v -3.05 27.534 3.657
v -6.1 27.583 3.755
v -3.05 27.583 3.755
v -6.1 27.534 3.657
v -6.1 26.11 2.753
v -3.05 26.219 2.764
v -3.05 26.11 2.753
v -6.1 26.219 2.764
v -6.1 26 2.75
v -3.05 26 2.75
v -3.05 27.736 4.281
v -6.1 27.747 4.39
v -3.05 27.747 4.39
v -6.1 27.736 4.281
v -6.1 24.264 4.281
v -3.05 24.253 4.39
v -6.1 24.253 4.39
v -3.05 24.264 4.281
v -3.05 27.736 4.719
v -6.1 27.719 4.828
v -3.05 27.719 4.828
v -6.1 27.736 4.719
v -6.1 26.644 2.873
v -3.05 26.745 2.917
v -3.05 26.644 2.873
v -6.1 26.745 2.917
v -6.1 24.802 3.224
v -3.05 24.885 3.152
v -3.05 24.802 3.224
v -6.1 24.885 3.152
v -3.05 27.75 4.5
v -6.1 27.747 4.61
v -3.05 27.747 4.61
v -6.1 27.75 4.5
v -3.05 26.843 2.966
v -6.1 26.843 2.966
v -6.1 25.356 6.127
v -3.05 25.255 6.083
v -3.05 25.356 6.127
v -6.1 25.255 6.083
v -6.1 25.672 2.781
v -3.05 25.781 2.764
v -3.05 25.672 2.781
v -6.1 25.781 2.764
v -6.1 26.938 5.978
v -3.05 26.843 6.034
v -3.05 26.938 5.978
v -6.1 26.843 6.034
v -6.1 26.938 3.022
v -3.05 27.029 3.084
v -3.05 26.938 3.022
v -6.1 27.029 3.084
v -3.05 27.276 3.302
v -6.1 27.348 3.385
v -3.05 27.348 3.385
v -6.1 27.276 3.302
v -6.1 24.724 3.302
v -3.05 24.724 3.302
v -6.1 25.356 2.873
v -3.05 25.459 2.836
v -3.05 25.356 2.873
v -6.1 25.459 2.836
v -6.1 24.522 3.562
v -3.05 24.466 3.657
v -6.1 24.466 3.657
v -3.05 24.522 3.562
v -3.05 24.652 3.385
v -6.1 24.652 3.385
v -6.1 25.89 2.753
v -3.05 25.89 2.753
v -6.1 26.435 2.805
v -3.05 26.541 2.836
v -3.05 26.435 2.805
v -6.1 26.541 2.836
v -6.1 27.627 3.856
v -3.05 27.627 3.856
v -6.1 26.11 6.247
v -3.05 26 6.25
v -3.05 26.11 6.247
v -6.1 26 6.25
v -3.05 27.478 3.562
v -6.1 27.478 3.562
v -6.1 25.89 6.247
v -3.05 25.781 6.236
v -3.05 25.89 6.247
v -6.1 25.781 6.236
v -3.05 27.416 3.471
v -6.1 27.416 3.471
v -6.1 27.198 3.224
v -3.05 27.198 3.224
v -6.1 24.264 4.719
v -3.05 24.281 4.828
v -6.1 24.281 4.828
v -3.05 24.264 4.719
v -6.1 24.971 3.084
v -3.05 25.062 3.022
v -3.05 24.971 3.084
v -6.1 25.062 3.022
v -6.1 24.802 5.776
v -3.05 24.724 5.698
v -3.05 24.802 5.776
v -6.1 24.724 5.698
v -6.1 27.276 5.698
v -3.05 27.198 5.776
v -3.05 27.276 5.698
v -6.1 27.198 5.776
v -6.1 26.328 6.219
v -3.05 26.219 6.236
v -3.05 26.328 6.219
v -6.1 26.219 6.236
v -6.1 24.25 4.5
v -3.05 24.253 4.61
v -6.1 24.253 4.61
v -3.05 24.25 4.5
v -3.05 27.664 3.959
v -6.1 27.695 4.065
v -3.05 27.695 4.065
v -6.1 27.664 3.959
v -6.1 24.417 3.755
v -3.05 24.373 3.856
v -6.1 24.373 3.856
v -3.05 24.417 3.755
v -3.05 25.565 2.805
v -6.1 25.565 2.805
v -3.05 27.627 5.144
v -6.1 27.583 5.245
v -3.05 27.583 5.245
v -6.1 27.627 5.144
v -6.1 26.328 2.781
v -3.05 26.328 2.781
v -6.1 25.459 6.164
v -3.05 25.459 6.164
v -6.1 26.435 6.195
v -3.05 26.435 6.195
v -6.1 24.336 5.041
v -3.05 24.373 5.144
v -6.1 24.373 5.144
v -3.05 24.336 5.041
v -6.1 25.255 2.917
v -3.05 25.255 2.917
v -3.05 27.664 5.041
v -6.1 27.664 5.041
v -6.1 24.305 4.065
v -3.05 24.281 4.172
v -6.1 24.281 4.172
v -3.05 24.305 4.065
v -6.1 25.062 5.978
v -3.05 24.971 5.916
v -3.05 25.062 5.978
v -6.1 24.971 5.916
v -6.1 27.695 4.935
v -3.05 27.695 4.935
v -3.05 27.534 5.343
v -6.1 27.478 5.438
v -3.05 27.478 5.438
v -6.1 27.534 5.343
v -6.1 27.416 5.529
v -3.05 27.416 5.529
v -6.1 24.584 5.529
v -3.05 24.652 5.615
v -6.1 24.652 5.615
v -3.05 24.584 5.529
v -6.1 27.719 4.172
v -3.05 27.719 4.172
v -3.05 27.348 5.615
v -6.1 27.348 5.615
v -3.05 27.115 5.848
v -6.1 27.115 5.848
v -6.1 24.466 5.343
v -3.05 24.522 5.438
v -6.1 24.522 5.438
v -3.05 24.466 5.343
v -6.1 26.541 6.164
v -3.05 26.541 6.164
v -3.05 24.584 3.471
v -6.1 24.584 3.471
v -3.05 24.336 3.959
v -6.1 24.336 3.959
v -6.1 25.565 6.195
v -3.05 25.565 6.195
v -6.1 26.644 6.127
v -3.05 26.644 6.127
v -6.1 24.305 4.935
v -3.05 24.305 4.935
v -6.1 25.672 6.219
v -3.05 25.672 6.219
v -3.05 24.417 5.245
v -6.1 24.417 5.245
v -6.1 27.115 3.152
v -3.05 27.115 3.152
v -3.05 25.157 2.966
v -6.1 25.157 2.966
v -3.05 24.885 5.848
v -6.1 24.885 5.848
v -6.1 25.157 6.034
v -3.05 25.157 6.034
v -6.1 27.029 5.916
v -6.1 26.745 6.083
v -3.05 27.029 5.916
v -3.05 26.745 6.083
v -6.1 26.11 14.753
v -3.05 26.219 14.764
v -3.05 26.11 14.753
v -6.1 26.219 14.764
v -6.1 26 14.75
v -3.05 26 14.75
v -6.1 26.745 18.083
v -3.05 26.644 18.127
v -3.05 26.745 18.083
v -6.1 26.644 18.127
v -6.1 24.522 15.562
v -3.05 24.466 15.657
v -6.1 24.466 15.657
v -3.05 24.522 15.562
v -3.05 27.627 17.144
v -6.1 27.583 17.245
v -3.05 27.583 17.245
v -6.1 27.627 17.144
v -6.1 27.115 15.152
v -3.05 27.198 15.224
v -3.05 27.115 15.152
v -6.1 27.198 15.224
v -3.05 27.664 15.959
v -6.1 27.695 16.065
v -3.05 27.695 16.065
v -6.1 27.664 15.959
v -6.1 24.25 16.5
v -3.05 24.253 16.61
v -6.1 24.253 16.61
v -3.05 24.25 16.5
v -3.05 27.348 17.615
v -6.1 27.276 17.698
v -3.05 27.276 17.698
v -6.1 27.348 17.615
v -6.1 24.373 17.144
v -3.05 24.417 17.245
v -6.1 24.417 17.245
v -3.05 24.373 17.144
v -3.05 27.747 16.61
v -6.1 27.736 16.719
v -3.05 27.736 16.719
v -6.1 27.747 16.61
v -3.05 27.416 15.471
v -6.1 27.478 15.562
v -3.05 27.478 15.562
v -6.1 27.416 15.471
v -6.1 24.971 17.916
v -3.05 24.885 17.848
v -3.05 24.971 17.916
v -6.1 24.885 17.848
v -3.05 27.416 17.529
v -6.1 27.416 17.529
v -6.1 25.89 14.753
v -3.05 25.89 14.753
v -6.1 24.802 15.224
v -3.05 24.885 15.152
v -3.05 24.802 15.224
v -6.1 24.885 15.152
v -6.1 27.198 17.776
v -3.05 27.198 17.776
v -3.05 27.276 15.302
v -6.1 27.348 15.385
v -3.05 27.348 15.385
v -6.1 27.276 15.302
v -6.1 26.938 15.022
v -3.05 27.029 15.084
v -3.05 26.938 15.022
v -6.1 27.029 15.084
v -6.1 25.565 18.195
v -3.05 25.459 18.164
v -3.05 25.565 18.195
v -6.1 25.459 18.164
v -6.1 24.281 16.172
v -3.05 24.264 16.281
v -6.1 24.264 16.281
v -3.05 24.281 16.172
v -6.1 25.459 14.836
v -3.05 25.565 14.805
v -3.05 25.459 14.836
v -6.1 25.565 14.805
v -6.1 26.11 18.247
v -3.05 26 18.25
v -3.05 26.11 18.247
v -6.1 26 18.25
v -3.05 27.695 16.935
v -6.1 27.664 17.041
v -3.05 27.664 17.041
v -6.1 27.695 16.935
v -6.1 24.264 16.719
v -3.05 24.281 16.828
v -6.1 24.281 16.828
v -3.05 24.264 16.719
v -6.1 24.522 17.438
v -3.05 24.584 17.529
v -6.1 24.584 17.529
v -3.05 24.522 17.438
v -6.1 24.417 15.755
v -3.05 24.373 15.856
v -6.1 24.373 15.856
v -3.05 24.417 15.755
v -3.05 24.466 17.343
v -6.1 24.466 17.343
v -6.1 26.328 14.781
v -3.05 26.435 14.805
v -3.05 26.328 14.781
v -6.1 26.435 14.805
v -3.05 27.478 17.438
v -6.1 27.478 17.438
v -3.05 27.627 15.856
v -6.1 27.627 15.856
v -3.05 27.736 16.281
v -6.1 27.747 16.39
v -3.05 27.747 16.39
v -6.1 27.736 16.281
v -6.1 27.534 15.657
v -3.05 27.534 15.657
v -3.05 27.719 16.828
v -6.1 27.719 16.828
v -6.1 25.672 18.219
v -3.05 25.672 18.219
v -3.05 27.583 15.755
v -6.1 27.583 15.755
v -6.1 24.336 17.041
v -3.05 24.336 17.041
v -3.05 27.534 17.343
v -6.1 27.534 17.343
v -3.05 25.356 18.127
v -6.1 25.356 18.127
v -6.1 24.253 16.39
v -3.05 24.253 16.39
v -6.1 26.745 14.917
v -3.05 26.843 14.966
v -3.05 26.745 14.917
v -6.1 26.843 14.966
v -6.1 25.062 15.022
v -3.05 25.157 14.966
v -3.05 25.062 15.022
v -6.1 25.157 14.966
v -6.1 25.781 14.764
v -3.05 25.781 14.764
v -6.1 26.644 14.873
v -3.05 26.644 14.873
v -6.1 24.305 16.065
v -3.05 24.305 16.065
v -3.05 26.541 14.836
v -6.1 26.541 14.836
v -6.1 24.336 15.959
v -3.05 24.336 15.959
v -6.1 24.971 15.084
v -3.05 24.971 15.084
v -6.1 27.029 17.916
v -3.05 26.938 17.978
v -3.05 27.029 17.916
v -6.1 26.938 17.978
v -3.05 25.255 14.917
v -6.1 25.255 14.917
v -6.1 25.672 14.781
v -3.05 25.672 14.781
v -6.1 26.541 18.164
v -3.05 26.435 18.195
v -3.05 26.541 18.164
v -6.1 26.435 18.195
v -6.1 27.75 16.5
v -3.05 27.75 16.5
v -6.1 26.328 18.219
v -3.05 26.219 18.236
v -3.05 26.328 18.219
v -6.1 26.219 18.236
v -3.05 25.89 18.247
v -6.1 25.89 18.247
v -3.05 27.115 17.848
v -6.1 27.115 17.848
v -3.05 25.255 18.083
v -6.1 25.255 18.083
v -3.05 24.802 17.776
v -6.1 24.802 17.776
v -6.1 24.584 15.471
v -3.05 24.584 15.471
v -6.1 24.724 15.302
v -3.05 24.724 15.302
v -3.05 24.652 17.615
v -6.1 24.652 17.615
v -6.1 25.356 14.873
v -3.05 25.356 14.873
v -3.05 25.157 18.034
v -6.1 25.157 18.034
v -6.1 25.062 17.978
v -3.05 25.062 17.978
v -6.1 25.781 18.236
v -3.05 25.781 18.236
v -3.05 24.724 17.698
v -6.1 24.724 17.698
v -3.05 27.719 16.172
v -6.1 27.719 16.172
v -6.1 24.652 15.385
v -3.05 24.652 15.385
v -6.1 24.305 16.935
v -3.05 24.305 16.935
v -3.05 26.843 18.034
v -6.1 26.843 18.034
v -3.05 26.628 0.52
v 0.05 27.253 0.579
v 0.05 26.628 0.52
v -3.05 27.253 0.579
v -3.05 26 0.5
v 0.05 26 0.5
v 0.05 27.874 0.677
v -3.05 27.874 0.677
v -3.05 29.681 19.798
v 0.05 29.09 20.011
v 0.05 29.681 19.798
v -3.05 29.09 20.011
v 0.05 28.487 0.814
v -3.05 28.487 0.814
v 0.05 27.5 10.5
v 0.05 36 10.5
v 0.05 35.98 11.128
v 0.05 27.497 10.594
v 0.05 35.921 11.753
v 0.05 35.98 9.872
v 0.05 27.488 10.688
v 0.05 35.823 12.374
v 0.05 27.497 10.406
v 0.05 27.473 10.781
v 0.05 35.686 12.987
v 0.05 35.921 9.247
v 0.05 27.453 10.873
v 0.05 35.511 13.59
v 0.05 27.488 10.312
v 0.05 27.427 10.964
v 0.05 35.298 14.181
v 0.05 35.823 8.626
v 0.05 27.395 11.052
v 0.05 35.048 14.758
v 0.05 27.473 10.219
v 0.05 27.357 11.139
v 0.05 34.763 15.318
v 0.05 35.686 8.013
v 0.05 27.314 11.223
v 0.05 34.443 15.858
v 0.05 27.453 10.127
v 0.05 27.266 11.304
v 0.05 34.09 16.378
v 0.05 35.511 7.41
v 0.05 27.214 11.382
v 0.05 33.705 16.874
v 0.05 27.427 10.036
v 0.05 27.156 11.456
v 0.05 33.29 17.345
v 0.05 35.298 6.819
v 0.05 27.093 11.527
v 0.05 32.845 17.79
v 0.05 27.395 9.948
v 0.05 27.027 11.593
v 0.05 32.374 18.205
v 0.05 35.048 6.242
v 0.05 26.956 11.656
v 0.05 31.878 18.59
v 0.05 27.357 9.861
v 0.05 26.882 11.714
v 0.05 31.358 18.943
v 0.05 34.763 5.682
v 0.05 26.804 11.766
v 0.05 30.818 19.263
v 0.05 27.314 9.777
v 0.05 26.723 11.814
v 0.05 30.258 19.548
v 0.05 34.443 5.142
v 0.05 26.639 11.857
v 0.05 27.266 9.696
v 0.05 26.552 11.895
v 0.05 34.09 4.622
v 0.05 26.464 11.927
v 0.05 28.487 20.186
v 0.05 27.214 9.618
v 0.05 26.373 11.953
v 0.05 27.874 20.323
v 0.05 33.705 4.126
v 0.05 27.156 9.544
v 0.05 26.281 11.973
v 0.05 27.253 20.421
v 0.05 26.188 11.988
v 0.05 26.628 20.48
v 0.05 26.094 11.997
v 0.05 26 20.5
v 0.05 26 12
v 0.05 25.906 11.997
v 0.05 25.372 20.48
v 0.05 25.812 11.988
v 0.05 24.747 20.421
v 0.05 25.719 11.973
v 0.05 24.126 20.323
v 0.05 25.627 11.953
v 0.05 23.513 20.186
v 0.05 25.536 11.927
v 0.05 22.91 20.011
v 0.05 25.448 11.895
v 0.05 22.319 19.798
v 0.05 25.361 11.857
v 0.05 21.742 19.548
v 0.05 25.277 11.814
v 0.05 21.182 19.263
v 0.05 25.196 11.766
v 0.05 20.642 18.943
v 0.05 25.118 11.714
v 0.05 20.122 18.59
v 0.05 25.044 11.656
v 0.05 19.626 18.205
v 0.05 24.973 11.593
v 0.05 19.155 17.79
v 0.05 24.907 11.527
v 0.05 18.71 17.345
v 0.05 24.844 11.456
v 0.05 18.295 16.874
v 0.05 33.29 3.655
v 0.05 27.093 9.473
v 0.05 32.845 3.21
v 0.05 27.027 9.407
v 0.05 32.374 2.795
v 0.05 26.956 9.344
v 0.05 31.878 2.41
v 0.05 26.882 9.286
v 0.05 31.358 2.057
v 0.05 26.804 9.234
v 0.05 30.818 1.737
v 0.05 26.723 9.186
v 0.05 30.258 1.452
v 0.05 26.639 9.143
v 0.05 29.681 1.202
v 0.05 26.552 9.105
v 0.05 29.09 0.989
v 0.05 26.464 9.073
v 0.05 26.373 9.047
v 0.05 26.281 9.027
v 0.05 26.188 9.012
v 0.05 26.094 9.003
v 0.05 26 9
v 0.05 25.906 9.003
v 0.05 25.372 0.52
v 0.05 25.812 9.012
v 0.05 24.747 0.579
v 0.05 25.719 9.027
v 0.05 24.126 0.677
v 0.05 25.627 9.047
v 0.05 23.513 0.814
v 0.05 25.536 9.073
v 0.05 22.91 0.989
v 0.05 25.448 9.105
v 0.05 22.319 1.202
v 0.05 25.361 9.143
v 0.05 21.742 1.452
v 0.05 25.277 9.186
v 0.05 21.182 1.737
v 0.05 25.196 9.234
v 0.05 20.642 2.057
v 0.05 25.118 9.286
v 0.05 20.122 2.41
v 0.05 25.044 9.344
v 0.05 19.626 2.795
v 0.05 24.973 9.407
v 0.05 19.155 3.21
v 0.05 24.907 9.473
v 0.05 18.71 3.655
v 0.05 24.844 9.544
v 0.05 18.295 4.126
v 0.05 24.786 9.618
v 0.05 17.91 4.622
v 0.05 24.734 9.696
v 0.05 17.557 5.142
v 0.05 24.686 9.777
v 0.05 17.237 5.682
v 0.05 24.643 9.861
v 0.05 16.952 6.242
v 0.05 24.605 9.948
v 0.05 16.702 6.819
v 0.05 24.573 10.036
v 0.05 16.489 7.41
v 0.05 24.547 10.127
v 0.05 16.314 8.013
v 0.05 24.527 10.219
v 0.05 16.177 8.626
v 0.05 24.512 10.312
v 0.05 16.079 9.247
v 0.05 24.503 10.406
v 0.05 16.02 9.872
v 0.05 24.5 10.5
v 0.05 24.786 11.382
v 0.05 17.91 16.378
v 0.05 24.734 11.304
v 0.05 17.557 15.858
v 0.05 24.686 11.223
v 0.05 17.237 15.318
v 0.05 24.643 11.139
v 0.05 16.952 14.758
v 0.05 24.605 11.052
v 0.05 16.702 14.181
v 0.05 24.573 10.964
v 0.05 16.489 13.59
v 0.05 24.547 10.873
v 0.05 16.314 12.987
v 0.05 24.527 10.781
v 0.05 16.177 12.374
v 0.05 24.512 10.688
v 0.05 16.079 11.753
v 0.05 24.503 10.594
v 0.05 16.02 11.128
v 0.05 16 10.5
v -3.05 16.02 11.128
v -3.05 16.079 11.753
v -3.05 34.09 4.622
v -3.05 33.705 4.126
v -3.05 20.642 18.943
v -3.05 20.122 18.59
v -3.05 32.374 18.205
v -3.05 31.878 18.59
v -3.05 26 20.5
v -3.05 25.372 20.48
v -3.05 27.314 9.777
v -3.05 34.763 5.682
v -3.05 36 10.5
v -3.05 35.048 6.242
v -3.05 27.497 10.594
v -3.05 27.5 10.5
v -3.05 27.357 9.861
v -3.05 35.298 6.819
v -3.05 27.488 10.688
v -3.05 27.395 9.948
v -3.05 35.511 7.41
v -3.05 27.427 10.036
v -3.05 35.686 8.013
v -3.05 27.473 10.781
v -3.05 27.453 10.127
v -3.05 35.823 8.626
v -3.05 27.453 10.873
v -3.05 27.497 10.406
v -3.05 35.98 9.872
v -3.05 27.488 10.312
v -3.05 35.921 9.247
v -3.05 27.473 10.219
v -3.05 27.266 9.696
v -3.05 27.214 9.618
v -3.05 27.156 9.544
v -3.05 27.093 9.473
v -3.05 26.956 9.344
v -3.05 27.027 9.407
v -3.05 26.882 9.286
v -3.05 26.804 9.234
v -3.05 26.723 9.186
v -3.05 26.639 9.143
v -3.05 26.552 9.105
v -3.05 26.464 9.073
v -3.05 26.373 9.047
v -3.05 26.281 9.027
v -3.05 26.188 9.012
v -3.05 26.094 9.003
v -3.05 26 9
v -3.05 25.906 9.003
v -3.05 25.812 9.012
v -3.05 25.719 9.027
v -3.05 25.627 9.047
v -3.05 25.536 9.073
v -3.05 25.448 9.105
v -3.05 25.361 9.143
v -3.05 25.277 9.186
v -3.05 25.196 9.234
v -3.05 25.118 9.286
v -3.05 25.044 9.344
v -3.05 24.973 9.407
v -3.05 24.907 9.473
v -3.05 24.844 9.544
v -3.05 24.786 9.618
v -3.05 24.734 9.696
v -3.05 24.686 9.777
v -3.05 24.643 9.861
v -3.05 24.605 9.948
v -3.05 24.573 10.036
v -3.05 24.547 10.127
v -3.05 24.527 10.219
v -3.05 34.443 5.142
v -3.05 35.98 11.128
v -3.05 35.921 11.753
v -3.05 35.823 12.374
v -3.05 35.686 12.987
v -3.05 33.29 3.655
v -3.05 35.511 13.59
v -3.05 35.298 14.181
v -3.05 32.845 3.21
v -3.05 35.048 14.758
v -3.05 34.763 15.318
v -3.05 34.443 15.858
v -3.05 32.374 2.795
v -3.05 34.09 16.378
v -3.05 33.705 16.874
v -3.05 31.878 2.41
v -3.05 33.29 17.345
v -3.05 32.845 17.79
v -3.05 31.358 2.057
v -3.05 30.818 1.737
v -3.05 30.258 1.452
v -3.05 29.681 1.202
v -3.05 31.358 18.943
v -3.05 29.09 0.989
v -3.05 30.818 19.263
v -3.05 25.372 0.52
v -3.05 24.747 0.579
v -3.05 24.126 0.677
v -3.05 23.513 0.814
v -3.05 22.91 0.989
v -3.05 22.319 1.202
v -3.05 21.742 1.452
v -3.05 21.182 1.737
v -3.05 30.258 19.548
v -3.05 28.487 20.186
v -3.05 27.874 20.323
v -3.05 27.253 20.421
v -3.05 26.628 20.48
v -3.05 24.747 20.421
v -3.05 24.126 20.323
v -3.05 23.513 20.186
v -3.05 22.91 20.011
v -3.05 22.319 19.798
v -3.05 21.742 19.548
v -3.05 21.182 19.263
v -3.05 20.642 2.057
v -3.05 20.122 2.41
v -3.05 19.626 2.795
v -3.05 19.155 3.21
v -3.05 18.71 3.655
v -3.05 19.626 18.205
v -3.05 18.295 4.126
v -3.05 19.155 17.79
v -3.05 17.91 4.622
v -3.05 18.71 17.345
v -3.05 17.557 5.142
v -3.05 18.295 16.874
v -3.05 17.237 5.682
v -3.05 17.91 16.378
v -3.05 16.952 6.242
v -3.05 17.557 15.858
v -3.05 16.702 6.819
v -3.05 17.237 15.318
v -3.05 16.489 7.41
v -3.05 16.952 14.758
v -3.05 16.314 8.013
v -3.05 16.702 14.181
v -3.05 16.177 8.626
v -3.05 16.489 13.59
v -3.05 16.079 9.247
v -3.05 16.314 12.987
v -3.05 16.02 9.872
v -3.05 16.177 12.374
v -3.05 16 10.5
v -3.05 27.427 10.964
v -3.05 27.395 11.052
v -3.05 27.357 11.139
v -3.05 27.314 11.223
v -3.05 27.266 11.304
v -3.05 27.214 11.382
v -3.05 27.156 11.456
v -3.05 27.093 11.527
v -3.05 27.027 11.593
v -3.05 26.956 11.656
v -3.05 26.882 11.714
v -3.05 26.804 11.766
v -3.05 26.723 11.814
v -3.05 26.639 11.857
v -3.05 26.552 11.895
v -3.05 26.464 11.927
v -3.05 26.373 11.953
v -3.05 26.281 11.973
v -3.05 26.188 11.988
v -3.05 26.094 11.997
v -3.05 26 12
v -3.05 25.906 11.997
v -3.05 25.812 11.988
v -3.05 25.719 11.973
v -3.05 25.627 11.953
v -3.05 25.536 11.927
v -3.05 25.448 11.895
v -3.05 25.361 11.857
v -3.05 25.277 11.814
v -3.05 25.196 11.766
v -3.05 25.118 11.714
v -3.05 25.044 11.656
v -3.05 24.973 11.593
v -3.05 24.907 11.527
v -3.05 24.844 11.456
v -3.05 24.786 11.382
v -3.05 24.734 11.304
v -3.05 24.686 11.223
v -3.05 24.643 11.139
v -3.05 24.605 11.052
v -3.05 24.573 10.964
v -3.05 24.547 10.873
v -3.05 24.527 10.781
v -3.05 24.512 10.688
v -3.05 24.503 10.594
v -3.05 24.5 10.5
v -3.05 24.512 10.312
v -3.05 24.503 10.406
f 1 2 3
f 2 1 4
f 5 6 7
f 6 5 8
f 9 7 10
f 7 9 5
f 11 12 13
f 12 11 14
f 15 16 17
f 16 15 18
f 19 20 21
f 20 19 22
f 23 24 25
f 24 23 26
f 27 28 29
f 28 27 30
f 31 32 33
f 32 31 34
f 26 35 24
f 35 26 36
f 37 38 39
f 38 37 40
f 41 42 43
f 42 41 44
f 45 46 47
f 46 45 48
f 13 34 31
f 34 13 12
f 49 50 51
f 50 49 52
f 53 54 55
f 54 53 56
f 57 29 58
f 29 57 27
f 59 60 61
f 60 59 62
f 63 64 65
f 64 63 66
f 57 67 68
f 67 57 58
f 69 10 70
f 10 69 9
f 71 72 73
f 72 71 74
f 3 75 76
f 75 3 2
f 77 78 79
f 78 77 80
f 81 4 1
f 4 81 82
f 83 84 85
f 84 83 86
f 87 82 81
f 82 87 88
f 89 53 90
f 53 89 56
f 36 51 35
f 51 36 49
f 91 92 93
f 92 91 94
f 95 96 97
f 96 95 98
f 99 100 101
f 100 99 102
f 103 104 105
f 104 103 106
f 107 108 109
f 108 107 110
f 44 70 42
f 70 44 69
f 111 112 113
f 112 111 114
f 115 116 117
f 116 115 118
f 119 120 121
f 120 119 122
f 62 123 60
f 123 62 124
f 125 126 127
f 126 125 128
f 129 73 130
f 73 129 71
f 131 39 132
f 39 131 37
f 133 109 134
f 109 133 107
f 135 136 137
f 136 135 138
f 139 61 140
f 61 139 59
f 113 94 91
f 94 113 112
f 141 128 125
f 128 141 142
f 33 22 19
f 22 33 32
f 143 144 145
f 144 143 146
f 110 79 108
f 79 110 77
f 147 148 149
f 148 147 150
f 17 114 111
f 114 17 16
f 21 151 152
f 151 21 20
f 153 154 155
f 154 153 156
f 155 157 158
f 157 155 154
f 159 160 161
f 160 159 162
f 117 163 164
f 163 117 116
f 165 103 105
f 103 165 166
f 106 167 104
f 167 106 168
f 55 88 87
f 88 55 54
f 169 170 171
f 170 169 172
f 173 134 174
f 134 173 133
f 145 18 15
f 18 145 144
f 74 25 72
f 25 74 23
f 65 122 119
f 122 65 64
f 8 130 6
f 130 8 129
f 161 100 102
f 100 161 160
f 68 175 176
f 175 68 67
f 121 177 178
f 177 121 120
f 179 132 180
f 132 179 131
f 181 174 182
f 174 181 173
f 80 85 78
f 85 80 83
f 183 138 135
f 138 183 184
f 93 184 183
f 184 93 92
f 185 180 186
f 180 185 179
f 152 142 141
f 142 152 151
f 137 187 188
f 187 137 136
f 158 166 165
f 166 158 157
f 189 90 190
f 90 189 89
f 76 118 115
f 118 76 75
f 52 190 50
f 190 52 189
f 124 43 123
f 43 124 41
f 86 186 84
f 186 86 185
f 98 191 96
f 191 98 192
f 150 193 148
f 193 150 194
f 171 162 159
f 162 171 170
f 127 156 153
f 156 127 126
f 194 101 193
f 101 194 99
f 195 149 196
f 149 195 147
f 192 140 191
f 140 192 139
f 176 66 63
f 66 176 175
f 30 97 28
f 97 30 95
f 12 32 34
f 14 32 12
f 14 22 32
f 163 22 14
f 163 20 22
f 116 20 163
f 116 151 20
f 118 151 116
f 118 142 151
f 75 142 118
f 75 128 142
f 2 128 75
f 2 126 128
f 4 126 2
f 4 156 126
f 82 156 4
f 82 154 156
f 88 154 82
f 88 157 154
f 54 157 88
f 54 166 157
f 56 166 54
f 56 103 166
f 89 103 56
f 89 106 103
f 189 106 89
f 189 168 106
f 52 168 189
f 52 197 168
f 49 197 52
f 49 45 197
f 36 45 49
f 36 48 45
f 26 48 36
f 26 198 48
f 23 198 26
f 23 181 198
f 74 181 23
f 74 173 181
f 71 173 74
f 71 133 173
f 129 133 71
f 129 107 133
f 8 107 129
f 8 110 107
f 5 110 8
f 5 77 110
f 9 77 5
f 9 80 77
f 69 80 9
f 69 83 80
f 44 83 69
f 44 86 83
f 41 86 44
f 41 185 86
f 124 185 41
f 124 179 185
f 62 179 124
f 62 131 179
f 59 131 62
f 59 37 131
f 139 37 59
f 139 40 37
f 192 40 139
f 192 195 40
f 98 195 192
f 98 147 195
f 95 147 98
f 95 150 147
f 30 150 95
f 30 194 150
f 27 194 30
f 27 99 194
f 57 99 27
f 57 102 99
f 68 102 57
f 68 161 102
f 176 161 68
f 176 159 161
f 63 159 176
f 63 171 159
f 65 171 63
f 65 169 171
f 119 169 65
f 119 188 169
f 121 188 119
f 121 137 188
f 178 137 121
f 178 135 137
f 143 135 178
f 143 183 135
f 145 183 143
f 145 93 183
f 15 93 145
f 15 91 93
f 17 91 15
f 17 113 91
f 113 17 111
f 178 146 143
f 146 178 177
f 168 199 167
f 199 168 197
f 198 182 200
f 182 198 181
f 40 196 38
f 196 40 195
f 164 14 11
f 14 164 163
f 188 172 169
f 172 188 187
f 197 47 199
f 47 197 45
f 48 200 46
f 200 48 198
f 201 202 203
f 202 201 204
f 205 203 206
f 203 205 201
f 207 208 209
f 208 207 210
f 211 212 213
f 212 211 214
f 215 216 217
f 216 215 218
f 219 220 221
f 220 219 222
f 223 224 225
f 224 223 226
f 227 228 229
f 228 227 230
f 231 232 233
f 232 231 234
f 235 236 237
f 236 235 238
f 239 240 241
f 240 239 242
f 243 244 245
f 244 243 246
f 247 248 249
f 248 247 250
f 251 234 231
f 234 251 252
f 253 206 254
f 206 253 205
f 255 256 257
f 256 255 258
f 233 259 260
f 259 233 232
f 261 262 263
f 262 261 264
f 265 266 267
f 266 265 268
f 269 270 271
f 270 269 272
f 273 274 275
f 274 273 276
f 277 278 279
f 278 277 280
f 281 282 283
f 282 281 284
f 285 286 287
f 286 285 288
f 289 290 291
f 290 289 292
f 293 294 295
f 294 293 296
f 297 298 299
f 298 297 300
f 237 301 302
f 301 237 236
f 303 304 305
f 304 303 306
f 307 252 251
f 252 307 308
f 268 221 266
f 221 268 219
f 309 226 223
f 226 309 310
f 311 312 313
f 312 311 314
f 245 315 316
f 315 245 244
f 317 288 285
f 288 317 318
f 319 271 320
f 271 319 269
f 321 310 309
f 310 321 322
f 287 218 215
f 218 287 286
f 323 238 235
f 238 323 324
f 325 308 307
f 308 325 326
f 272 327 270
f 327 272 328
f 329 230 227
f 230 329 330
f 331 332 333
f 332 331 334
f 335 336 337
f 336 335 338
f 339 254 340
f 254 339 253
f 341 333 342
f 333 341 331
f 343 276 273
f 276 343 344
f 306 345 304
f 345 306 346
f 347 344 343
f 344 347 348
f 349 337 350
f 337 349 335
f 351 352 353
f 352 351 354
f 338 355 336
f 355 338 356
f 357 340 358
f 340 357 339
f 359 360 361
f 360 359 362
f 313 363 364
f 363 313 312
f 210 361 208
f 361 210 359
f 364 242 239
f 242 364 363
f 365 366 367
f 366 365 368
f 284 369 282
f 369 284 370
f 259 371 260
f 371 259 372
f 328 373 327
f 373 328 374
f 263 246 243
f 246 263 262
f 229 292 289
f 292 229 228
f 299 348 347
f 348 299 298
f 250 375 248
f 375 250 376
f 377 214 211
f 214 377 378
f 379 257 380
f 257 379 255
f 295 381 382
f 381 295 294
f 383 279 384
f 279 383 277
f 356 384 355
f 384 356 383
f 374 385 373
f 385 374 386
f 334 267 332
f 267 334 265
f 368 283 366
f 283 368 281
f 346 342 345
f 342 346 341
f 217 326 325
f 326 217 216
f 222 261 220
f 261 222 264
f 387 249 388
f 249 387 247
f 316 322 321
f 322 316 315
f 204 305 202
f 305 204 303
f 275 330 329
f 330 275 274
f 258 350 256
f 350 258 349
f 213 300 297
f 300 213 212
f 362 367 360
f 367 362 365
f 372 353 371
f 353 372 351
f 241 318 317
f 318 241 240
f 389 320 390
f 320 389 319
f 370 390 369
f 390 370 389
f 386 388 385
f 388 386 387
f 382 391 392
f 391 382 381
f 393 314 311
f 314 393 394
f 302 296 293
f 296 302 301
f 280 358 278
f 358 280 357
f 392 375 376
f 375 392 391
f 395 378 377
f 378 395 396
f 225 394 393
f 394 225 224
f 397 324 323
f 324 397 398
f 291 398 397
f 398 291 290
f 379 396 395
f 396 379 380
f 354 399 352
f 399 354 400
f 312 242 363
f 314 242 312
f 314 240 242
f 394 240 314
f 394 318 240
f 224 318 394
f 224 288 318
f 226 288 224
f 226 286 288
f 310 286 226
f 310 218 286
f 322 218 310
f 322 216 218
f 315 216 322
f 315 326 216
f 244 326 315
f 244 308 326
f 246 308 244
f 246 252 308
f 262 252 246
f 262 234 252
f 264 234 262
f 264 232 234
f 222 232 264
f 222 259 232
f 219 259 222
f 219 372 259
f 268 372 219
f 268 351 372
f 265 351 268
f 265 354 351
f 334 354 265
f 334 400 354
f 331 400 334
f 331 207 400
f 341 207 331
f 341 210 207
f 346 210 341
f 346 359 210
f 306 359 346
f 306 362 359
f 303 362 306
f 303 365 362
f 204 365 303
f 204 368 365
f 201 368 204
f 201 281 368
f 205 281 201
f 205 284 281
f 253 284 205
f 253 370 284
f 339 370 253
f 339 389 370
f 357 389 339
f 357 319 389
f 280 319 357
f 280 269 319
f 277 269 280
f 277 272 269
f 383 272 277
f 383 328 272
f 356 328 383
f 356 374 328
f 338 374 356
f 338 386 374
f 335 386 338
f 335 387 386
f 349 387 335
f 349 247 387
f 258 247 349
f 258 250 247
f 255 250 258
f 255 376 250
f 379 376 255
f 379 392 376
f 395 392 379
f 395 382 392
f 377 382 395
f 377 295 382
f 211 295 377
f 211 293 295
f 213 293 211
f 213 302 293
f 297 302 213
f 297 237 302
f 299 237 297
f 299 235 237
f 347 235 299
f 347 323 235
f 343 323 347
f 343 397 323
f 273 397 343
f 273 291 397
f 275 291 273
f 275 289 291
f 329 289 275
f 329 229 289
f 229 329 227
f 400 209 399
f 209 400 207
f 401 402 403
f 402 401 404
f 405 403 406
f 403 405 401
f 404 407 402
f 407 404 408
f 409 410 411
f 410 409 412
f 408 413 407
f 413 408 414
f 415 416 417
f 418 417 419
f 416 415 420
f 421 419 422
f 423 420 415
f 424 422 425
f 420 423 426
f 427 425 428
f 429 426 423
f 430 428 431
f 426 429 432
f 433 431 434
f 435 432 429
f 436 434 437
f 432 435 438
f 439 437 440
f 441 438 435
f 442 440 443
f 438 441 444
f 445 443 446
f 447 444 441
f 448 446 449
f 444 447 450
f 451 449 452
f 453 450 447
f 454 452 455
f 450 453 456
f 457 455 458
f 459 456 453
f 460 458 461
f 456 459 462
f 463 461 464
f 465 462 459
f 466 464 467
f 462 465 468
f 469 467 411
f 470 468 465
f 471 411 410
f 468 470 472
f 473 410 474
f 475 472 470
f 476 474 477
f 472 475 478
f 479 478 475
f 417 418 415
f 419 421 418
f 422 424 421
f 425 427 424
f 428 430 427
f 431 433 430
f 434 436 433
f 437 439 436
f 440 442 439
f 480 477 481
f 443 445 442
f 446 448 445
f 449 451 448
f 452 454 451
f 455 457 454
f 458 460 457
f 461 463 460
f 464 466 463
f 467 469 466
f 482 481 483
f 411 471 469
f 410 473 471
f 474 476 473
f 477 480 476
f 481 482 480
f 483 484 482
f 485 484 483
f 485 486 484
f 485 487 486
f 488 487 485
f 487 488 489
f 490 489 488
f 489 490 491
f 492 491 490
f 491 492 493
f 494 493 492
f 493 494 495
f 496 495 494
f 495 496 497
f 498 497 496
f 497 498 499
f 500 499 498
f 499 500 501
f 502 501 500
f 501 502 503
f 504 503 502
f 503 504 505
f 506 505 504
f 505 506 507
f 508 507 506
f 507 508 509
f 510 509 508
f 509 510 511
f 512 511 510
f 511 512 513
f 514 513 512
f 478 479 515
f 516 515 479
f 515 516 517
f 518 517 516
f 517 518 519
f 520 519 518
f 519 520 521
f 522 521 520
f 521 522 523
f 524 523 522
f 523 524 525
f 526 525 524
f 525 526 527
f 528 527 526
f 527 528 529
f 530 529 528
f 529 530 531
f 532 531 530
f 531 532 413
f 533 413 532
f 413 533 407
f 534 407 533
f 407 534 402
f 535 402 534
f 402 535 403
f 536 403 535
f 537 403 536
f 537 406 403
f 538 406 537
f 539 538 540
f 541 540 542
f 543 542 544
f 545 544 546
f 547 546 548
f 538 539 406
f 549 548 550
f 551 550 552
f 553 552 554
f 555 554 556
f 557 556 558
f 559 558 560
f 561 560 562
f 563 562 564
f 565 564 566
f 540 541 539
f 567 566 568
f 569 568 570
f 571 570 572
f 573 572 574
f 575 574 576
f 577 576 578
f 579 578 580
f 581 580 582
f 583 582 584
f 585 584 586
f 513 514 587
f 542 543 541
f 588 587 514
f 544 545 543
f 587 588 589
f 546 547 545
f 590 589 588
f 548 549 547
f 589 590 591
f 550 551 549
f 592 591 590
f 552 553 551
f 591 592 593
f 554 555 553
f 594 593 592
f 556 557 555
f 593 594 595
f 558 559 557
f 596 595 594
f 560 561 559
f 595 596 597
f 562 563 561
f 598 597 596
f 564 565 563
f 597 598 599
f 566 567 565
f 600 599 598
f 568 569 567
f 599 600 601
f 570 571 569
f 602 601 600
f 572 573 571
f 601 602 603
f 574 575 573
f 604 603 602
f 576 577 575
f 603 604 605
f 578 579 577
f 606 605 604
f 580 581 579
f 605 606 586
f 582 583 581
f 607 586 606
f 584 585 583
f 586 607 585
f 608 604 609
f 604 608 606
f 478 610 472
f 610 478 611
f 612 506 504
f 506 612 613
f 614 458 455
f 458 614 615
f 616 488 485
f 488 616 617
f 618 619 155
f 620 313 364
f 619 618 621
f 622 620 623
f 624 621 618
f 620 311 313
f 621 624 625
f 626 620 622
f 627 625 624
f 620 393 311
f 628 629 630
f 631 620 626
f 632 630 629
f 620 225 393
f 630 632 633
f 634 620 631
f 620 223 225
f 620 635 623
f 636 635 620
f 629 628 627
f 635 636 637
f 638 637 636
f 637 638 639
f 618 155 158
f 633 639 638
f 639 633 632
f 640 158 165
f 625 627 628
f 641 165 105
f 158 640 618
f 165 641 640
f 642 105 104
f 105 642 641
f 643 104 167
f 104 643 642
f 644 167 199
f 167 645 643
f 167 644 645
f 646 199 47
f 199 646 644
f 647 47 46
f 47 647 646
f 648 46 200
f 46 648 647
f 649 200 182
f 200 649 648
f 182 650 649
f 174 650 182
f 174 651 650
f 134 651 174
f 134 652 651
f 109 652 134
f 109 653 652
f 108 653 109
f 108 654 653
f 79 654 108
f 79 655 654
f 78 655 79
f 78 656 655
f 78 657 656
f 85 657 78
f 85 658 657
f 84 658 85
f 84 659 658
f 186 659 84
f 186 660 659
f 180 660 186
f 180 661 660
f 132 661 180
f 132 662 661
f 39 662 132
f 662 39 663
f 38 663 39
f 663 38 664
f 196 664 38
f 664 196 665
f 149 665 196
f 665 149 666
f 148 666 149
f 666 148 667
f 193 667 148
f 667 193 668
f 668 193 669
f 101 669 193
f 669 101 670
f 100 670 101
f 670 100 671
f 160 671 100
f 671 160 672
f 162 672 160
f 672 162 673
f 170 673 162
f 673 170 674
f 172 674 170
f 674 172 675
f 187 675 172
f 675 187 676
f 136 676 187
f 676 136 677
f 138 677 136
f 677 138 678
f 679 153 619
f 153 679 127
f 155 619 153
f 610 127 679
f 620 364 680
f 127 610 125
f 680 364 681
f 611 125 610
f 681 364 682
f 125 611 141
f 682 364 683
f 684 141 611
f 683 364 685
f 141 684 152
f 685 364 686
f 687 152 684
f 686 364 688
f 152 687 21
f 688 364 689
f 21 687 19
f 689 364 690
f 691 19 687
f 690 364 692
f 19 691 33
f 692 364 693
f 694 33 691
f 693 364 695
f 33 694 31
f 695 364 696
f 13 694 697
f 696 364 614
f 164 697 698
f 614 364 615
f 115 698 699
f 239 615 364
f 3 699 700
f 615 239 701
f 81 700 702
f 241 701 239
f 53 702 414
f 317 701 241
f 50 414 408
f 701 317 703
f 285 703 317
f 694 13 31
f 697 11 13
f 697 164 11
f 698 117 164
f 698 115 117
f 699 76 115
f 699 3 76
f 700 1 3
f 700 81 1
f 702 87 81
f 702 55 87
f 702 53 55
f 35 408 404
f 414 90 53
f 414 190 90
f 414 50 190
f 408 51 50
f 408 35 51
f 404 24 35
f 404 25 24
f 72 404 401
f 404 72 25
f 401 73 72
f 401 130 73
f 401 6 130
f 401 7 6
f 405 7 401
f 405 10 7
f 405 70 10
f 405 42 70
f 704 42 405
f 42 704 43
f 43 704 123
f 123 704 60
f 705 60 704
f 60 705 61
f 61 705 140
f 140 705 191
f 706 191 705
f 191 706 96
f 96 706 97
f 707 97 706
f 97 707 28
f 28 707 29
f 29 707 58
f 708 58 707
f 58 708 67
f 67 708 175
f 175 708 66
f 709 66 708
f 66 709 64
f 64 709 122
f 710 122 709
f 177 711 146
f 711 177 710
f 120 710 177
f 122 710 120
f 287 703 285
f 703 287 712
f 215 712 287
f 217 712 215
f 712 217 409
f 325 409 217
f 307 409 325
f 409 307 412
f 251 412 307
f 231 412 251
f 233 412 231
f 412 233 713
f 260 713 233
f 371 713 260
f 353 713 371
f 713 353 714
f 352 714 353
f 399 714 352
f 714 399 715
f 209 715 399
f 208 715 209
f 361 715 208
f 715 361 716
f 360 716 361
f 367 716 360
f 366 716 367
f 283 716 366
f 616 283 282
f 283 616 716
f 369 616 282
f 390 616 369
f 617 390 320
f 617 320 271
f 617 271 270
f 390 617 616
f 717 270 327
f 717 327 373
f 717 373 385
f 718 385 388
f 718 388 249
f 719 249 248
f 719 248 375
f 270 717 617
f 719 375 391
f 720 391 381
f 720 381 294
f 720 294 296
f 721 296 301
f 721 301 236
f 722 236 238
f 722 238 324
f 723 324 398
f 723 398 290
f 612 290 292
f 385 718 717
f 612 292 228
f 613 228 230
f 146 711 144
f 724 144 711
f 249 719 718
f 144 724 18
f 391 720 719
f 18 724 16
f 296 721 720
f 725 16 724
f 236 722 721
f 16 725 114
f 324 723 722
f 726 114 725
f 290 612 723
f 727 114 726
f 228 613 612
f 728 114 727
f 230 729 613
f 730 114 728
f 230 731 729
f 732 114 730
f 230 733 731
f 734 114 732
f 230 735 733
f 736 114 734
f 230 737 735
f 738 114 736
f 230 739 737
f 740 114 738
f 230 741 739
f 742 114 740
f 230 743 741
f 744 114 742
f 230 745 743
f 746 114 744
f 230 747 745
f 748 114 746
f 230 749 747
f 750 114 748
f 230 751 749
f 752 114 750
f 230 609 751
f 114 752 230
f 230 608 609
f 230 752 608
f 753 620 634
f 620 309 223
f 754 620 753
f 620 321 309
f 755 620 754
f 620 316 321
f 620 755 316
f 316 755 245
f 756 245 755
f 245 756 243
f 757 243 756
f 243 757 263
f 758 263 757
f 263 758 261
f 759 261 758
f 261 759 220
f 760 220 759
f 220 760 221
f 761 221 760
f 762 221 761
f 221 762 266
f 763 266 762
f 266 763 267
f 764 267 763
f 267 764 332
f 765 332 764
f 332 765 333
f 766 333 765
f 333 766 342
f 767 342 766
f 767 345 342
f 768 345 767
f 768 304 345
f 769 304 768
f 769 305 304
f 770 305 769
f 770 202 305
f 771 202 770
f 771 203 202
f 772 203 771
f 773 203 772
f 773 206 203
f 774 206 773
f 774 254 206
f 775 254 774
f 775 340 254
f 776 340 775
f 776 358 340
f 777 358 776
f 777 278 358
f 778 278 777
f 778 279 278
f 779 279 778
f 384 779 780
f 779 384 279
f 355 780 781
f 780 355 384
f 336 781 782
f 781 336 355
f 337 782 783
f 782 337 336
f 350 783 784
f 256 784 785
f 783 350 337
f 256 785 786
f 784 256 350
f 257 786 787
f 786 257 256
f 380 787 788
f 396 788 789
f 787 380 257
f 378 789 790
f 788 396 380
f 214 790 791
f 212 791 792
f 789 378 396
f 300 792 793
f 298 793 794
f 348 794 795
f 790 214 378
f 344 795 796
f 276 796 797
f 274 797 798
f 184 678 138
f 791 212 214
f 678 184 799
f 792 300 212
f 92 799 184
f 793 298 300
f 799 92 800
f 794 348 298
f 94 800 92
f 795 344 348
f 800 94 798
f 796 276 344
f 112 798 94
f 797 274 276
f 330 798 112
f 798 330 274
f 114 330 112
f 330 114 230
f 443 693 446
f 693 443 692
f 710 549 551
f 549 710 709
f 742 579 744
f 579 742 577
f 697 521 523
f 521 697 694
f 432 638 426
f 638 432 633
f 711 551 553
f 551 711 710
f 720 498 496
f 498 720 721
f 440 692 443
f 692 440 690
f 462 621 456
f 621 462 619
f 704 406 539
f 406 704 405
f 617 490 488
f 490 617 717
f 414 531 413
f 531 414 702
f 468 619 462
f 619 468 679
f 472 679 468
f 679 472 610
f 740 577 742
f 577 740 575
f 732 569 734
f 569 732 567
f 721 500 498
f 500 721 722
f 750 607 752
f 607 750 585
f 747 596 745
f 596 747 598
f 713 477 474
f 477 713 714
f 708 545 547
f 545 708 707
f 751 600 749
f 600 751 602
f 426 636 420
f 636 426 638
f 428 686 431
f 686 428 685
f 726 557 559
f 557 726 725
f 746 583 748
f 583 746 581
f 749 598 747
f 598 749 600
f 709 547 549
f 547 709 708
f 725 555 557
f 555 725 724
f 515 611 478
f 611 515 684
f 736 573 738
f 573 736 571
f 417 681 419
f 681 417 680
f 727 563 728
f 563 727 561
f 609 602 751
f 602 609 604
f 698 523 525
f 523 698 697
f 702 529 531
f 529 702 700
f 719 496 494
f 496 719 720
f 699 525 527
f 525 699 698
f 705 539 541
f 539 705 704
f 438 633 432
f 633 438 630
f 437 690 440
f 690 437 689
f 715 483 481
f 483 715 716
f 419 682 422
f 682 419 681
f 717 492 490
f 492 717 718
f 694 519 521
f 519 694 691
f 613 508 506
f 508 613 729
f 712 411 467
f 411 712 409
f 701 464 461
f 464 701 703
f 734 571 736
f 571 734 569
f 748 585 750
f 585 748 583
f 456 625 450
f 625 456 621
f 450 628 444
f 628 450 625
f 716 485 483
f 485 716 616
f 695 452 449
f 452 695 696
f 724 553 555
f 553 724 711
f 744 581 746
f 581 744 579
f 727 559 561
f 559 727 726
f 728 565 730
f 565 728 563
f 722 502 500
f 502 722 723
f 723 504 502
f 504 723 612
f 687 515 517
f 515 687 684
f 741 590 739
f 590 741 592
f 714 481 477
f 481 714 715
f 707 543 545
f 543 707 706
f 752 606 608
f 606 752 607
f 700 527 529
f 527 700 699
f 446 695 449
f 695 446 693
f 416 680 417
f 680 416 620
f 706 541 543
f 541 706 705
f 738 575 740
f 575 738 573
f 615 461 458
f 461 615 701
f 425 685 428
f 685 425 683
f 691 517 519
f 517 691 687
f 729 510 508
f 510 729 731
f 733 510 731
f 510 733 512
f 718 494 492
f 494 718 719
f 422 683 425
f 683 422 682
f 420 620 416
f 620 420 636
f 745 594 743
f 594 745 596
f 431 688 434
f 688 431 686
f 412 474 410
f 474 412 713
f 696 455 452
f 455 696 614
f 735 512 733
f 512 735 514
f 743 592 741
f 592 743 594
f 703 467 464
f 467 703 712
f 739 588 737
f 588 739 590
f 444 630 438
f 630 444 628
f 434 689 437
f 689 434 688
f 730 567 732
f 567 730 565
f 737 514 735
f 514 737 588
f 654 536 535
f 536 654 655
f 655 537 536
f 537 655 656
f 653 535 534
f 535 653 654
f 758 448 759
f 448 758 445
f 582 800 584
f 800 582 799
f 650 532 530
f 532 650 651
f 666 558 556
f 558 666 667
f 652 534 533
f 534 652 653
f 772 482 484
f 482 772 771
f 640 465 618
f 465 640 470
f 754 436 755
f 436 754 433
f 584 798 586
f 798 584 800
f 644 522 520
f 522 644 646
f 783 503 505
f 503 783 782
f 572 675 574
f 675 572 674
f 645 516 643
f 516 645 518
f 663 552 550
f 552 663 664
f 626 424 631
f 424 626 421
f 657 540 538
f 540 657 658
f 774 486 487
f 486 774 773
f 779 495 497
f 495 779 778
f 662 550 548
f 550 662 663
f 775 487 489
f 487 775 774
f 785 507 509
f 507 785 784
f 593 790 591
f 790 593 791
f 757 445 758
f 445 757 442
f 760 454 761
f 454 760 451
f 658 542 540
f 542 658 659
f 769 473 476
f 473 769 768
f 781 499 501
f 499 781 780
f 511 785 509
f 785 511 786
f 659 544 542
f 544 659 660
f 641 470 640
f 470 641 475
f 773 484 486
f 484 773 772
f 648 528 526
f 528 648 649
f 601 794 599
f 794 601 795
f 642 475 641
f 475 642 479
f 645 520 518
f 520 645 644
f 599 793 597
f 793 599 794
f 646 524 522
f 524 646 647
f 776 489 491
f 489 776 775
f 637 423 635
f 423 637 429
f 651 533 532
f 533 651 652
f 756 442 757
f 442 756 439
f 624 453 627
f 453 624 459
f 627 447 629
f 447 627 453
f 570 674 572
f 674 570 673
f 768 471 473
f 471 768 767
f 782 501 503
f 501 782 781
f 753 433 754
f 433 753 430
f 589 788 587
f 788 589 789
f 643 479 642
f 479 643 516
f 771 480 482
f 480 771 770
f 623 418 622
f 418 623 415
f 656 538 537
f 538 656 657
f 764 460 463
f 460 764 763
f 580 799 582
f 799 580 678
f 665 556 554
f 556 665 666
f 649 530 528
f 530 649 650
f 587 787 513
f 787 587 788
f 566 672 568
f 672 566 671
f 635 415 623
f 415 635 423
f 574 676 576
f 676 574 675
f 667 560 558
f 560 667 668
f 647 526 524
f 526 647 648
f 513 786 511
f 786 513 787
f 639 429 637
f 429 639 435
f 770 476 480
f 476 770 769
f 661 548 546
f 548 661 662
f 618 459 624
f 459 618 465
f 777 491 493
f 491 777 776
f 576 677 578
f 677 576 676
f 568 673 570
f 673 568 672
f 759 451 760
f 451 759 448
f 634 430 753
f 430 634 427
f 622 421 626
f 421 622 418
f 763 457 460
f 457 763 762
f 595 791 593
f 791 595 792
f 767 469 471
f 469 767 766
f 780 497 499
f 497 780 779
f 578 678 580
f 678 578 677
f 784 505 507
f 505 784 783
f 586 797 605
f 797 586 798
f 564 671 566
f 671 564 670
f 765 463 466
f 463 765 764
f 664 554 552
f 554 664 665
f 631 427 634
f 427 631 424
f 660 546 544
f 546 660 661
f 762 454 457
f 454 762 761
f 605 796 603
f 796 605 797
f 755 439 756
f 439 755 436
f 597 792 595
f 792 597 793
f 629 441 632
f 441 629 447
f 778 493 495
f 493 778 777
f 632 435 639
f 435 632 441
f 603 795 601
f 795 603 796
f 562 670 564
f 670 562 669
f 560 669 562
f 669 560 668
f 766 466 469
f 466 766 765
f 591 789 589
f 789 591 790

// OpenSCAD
$fn=100;
longueur_servo = 24;
largeur_servo = 21; // 24 en comptant les elements qui depassent
hauteur_servo = 36;
diametre_vis = 4;
diametre_rotor = 18;
longueur_rotor = 3;
D=8;
L=15;

module liaison_moteur_sys_parasol(){

 color("dimgray") translate([-1.5, 26, 10.5]) rotate([0, 90, 0])
	difference(){
    union(){
        cylinder(h=3.1, d = 20, center = true);
        for(i = [0:1]){
            //translate([6*cos(i*90), 6*sin(i*90), 0]) cylinder(h=3.2, d=1, center=true);
            translate([6*cos(2*i*90), 6*sin(2*i*90), -3]) cylinder(h=3.2, d=3.5, center=true);
        }
	}
        cylinder(h=3.2, d=3, center=true);

    }

/*translate([0,26,10.5])difference() {
		rotate([0,90,0])cylinder(h=L,d=D);
		translate([-1,0,0])rotate([0,90,0])cylinder(d=(D-1.5), h=L+2);

	}
	translate([L,26,10.5])rotate([0,90,0])difference(){
		translate([0,0,0])cylinder(h=5,r1=D/2,r2=4.8/2);
		translate([0,0,0])cylinder(d=3,h=10);
	}*/
	
}

liaison_moteur_sys_parasol();
